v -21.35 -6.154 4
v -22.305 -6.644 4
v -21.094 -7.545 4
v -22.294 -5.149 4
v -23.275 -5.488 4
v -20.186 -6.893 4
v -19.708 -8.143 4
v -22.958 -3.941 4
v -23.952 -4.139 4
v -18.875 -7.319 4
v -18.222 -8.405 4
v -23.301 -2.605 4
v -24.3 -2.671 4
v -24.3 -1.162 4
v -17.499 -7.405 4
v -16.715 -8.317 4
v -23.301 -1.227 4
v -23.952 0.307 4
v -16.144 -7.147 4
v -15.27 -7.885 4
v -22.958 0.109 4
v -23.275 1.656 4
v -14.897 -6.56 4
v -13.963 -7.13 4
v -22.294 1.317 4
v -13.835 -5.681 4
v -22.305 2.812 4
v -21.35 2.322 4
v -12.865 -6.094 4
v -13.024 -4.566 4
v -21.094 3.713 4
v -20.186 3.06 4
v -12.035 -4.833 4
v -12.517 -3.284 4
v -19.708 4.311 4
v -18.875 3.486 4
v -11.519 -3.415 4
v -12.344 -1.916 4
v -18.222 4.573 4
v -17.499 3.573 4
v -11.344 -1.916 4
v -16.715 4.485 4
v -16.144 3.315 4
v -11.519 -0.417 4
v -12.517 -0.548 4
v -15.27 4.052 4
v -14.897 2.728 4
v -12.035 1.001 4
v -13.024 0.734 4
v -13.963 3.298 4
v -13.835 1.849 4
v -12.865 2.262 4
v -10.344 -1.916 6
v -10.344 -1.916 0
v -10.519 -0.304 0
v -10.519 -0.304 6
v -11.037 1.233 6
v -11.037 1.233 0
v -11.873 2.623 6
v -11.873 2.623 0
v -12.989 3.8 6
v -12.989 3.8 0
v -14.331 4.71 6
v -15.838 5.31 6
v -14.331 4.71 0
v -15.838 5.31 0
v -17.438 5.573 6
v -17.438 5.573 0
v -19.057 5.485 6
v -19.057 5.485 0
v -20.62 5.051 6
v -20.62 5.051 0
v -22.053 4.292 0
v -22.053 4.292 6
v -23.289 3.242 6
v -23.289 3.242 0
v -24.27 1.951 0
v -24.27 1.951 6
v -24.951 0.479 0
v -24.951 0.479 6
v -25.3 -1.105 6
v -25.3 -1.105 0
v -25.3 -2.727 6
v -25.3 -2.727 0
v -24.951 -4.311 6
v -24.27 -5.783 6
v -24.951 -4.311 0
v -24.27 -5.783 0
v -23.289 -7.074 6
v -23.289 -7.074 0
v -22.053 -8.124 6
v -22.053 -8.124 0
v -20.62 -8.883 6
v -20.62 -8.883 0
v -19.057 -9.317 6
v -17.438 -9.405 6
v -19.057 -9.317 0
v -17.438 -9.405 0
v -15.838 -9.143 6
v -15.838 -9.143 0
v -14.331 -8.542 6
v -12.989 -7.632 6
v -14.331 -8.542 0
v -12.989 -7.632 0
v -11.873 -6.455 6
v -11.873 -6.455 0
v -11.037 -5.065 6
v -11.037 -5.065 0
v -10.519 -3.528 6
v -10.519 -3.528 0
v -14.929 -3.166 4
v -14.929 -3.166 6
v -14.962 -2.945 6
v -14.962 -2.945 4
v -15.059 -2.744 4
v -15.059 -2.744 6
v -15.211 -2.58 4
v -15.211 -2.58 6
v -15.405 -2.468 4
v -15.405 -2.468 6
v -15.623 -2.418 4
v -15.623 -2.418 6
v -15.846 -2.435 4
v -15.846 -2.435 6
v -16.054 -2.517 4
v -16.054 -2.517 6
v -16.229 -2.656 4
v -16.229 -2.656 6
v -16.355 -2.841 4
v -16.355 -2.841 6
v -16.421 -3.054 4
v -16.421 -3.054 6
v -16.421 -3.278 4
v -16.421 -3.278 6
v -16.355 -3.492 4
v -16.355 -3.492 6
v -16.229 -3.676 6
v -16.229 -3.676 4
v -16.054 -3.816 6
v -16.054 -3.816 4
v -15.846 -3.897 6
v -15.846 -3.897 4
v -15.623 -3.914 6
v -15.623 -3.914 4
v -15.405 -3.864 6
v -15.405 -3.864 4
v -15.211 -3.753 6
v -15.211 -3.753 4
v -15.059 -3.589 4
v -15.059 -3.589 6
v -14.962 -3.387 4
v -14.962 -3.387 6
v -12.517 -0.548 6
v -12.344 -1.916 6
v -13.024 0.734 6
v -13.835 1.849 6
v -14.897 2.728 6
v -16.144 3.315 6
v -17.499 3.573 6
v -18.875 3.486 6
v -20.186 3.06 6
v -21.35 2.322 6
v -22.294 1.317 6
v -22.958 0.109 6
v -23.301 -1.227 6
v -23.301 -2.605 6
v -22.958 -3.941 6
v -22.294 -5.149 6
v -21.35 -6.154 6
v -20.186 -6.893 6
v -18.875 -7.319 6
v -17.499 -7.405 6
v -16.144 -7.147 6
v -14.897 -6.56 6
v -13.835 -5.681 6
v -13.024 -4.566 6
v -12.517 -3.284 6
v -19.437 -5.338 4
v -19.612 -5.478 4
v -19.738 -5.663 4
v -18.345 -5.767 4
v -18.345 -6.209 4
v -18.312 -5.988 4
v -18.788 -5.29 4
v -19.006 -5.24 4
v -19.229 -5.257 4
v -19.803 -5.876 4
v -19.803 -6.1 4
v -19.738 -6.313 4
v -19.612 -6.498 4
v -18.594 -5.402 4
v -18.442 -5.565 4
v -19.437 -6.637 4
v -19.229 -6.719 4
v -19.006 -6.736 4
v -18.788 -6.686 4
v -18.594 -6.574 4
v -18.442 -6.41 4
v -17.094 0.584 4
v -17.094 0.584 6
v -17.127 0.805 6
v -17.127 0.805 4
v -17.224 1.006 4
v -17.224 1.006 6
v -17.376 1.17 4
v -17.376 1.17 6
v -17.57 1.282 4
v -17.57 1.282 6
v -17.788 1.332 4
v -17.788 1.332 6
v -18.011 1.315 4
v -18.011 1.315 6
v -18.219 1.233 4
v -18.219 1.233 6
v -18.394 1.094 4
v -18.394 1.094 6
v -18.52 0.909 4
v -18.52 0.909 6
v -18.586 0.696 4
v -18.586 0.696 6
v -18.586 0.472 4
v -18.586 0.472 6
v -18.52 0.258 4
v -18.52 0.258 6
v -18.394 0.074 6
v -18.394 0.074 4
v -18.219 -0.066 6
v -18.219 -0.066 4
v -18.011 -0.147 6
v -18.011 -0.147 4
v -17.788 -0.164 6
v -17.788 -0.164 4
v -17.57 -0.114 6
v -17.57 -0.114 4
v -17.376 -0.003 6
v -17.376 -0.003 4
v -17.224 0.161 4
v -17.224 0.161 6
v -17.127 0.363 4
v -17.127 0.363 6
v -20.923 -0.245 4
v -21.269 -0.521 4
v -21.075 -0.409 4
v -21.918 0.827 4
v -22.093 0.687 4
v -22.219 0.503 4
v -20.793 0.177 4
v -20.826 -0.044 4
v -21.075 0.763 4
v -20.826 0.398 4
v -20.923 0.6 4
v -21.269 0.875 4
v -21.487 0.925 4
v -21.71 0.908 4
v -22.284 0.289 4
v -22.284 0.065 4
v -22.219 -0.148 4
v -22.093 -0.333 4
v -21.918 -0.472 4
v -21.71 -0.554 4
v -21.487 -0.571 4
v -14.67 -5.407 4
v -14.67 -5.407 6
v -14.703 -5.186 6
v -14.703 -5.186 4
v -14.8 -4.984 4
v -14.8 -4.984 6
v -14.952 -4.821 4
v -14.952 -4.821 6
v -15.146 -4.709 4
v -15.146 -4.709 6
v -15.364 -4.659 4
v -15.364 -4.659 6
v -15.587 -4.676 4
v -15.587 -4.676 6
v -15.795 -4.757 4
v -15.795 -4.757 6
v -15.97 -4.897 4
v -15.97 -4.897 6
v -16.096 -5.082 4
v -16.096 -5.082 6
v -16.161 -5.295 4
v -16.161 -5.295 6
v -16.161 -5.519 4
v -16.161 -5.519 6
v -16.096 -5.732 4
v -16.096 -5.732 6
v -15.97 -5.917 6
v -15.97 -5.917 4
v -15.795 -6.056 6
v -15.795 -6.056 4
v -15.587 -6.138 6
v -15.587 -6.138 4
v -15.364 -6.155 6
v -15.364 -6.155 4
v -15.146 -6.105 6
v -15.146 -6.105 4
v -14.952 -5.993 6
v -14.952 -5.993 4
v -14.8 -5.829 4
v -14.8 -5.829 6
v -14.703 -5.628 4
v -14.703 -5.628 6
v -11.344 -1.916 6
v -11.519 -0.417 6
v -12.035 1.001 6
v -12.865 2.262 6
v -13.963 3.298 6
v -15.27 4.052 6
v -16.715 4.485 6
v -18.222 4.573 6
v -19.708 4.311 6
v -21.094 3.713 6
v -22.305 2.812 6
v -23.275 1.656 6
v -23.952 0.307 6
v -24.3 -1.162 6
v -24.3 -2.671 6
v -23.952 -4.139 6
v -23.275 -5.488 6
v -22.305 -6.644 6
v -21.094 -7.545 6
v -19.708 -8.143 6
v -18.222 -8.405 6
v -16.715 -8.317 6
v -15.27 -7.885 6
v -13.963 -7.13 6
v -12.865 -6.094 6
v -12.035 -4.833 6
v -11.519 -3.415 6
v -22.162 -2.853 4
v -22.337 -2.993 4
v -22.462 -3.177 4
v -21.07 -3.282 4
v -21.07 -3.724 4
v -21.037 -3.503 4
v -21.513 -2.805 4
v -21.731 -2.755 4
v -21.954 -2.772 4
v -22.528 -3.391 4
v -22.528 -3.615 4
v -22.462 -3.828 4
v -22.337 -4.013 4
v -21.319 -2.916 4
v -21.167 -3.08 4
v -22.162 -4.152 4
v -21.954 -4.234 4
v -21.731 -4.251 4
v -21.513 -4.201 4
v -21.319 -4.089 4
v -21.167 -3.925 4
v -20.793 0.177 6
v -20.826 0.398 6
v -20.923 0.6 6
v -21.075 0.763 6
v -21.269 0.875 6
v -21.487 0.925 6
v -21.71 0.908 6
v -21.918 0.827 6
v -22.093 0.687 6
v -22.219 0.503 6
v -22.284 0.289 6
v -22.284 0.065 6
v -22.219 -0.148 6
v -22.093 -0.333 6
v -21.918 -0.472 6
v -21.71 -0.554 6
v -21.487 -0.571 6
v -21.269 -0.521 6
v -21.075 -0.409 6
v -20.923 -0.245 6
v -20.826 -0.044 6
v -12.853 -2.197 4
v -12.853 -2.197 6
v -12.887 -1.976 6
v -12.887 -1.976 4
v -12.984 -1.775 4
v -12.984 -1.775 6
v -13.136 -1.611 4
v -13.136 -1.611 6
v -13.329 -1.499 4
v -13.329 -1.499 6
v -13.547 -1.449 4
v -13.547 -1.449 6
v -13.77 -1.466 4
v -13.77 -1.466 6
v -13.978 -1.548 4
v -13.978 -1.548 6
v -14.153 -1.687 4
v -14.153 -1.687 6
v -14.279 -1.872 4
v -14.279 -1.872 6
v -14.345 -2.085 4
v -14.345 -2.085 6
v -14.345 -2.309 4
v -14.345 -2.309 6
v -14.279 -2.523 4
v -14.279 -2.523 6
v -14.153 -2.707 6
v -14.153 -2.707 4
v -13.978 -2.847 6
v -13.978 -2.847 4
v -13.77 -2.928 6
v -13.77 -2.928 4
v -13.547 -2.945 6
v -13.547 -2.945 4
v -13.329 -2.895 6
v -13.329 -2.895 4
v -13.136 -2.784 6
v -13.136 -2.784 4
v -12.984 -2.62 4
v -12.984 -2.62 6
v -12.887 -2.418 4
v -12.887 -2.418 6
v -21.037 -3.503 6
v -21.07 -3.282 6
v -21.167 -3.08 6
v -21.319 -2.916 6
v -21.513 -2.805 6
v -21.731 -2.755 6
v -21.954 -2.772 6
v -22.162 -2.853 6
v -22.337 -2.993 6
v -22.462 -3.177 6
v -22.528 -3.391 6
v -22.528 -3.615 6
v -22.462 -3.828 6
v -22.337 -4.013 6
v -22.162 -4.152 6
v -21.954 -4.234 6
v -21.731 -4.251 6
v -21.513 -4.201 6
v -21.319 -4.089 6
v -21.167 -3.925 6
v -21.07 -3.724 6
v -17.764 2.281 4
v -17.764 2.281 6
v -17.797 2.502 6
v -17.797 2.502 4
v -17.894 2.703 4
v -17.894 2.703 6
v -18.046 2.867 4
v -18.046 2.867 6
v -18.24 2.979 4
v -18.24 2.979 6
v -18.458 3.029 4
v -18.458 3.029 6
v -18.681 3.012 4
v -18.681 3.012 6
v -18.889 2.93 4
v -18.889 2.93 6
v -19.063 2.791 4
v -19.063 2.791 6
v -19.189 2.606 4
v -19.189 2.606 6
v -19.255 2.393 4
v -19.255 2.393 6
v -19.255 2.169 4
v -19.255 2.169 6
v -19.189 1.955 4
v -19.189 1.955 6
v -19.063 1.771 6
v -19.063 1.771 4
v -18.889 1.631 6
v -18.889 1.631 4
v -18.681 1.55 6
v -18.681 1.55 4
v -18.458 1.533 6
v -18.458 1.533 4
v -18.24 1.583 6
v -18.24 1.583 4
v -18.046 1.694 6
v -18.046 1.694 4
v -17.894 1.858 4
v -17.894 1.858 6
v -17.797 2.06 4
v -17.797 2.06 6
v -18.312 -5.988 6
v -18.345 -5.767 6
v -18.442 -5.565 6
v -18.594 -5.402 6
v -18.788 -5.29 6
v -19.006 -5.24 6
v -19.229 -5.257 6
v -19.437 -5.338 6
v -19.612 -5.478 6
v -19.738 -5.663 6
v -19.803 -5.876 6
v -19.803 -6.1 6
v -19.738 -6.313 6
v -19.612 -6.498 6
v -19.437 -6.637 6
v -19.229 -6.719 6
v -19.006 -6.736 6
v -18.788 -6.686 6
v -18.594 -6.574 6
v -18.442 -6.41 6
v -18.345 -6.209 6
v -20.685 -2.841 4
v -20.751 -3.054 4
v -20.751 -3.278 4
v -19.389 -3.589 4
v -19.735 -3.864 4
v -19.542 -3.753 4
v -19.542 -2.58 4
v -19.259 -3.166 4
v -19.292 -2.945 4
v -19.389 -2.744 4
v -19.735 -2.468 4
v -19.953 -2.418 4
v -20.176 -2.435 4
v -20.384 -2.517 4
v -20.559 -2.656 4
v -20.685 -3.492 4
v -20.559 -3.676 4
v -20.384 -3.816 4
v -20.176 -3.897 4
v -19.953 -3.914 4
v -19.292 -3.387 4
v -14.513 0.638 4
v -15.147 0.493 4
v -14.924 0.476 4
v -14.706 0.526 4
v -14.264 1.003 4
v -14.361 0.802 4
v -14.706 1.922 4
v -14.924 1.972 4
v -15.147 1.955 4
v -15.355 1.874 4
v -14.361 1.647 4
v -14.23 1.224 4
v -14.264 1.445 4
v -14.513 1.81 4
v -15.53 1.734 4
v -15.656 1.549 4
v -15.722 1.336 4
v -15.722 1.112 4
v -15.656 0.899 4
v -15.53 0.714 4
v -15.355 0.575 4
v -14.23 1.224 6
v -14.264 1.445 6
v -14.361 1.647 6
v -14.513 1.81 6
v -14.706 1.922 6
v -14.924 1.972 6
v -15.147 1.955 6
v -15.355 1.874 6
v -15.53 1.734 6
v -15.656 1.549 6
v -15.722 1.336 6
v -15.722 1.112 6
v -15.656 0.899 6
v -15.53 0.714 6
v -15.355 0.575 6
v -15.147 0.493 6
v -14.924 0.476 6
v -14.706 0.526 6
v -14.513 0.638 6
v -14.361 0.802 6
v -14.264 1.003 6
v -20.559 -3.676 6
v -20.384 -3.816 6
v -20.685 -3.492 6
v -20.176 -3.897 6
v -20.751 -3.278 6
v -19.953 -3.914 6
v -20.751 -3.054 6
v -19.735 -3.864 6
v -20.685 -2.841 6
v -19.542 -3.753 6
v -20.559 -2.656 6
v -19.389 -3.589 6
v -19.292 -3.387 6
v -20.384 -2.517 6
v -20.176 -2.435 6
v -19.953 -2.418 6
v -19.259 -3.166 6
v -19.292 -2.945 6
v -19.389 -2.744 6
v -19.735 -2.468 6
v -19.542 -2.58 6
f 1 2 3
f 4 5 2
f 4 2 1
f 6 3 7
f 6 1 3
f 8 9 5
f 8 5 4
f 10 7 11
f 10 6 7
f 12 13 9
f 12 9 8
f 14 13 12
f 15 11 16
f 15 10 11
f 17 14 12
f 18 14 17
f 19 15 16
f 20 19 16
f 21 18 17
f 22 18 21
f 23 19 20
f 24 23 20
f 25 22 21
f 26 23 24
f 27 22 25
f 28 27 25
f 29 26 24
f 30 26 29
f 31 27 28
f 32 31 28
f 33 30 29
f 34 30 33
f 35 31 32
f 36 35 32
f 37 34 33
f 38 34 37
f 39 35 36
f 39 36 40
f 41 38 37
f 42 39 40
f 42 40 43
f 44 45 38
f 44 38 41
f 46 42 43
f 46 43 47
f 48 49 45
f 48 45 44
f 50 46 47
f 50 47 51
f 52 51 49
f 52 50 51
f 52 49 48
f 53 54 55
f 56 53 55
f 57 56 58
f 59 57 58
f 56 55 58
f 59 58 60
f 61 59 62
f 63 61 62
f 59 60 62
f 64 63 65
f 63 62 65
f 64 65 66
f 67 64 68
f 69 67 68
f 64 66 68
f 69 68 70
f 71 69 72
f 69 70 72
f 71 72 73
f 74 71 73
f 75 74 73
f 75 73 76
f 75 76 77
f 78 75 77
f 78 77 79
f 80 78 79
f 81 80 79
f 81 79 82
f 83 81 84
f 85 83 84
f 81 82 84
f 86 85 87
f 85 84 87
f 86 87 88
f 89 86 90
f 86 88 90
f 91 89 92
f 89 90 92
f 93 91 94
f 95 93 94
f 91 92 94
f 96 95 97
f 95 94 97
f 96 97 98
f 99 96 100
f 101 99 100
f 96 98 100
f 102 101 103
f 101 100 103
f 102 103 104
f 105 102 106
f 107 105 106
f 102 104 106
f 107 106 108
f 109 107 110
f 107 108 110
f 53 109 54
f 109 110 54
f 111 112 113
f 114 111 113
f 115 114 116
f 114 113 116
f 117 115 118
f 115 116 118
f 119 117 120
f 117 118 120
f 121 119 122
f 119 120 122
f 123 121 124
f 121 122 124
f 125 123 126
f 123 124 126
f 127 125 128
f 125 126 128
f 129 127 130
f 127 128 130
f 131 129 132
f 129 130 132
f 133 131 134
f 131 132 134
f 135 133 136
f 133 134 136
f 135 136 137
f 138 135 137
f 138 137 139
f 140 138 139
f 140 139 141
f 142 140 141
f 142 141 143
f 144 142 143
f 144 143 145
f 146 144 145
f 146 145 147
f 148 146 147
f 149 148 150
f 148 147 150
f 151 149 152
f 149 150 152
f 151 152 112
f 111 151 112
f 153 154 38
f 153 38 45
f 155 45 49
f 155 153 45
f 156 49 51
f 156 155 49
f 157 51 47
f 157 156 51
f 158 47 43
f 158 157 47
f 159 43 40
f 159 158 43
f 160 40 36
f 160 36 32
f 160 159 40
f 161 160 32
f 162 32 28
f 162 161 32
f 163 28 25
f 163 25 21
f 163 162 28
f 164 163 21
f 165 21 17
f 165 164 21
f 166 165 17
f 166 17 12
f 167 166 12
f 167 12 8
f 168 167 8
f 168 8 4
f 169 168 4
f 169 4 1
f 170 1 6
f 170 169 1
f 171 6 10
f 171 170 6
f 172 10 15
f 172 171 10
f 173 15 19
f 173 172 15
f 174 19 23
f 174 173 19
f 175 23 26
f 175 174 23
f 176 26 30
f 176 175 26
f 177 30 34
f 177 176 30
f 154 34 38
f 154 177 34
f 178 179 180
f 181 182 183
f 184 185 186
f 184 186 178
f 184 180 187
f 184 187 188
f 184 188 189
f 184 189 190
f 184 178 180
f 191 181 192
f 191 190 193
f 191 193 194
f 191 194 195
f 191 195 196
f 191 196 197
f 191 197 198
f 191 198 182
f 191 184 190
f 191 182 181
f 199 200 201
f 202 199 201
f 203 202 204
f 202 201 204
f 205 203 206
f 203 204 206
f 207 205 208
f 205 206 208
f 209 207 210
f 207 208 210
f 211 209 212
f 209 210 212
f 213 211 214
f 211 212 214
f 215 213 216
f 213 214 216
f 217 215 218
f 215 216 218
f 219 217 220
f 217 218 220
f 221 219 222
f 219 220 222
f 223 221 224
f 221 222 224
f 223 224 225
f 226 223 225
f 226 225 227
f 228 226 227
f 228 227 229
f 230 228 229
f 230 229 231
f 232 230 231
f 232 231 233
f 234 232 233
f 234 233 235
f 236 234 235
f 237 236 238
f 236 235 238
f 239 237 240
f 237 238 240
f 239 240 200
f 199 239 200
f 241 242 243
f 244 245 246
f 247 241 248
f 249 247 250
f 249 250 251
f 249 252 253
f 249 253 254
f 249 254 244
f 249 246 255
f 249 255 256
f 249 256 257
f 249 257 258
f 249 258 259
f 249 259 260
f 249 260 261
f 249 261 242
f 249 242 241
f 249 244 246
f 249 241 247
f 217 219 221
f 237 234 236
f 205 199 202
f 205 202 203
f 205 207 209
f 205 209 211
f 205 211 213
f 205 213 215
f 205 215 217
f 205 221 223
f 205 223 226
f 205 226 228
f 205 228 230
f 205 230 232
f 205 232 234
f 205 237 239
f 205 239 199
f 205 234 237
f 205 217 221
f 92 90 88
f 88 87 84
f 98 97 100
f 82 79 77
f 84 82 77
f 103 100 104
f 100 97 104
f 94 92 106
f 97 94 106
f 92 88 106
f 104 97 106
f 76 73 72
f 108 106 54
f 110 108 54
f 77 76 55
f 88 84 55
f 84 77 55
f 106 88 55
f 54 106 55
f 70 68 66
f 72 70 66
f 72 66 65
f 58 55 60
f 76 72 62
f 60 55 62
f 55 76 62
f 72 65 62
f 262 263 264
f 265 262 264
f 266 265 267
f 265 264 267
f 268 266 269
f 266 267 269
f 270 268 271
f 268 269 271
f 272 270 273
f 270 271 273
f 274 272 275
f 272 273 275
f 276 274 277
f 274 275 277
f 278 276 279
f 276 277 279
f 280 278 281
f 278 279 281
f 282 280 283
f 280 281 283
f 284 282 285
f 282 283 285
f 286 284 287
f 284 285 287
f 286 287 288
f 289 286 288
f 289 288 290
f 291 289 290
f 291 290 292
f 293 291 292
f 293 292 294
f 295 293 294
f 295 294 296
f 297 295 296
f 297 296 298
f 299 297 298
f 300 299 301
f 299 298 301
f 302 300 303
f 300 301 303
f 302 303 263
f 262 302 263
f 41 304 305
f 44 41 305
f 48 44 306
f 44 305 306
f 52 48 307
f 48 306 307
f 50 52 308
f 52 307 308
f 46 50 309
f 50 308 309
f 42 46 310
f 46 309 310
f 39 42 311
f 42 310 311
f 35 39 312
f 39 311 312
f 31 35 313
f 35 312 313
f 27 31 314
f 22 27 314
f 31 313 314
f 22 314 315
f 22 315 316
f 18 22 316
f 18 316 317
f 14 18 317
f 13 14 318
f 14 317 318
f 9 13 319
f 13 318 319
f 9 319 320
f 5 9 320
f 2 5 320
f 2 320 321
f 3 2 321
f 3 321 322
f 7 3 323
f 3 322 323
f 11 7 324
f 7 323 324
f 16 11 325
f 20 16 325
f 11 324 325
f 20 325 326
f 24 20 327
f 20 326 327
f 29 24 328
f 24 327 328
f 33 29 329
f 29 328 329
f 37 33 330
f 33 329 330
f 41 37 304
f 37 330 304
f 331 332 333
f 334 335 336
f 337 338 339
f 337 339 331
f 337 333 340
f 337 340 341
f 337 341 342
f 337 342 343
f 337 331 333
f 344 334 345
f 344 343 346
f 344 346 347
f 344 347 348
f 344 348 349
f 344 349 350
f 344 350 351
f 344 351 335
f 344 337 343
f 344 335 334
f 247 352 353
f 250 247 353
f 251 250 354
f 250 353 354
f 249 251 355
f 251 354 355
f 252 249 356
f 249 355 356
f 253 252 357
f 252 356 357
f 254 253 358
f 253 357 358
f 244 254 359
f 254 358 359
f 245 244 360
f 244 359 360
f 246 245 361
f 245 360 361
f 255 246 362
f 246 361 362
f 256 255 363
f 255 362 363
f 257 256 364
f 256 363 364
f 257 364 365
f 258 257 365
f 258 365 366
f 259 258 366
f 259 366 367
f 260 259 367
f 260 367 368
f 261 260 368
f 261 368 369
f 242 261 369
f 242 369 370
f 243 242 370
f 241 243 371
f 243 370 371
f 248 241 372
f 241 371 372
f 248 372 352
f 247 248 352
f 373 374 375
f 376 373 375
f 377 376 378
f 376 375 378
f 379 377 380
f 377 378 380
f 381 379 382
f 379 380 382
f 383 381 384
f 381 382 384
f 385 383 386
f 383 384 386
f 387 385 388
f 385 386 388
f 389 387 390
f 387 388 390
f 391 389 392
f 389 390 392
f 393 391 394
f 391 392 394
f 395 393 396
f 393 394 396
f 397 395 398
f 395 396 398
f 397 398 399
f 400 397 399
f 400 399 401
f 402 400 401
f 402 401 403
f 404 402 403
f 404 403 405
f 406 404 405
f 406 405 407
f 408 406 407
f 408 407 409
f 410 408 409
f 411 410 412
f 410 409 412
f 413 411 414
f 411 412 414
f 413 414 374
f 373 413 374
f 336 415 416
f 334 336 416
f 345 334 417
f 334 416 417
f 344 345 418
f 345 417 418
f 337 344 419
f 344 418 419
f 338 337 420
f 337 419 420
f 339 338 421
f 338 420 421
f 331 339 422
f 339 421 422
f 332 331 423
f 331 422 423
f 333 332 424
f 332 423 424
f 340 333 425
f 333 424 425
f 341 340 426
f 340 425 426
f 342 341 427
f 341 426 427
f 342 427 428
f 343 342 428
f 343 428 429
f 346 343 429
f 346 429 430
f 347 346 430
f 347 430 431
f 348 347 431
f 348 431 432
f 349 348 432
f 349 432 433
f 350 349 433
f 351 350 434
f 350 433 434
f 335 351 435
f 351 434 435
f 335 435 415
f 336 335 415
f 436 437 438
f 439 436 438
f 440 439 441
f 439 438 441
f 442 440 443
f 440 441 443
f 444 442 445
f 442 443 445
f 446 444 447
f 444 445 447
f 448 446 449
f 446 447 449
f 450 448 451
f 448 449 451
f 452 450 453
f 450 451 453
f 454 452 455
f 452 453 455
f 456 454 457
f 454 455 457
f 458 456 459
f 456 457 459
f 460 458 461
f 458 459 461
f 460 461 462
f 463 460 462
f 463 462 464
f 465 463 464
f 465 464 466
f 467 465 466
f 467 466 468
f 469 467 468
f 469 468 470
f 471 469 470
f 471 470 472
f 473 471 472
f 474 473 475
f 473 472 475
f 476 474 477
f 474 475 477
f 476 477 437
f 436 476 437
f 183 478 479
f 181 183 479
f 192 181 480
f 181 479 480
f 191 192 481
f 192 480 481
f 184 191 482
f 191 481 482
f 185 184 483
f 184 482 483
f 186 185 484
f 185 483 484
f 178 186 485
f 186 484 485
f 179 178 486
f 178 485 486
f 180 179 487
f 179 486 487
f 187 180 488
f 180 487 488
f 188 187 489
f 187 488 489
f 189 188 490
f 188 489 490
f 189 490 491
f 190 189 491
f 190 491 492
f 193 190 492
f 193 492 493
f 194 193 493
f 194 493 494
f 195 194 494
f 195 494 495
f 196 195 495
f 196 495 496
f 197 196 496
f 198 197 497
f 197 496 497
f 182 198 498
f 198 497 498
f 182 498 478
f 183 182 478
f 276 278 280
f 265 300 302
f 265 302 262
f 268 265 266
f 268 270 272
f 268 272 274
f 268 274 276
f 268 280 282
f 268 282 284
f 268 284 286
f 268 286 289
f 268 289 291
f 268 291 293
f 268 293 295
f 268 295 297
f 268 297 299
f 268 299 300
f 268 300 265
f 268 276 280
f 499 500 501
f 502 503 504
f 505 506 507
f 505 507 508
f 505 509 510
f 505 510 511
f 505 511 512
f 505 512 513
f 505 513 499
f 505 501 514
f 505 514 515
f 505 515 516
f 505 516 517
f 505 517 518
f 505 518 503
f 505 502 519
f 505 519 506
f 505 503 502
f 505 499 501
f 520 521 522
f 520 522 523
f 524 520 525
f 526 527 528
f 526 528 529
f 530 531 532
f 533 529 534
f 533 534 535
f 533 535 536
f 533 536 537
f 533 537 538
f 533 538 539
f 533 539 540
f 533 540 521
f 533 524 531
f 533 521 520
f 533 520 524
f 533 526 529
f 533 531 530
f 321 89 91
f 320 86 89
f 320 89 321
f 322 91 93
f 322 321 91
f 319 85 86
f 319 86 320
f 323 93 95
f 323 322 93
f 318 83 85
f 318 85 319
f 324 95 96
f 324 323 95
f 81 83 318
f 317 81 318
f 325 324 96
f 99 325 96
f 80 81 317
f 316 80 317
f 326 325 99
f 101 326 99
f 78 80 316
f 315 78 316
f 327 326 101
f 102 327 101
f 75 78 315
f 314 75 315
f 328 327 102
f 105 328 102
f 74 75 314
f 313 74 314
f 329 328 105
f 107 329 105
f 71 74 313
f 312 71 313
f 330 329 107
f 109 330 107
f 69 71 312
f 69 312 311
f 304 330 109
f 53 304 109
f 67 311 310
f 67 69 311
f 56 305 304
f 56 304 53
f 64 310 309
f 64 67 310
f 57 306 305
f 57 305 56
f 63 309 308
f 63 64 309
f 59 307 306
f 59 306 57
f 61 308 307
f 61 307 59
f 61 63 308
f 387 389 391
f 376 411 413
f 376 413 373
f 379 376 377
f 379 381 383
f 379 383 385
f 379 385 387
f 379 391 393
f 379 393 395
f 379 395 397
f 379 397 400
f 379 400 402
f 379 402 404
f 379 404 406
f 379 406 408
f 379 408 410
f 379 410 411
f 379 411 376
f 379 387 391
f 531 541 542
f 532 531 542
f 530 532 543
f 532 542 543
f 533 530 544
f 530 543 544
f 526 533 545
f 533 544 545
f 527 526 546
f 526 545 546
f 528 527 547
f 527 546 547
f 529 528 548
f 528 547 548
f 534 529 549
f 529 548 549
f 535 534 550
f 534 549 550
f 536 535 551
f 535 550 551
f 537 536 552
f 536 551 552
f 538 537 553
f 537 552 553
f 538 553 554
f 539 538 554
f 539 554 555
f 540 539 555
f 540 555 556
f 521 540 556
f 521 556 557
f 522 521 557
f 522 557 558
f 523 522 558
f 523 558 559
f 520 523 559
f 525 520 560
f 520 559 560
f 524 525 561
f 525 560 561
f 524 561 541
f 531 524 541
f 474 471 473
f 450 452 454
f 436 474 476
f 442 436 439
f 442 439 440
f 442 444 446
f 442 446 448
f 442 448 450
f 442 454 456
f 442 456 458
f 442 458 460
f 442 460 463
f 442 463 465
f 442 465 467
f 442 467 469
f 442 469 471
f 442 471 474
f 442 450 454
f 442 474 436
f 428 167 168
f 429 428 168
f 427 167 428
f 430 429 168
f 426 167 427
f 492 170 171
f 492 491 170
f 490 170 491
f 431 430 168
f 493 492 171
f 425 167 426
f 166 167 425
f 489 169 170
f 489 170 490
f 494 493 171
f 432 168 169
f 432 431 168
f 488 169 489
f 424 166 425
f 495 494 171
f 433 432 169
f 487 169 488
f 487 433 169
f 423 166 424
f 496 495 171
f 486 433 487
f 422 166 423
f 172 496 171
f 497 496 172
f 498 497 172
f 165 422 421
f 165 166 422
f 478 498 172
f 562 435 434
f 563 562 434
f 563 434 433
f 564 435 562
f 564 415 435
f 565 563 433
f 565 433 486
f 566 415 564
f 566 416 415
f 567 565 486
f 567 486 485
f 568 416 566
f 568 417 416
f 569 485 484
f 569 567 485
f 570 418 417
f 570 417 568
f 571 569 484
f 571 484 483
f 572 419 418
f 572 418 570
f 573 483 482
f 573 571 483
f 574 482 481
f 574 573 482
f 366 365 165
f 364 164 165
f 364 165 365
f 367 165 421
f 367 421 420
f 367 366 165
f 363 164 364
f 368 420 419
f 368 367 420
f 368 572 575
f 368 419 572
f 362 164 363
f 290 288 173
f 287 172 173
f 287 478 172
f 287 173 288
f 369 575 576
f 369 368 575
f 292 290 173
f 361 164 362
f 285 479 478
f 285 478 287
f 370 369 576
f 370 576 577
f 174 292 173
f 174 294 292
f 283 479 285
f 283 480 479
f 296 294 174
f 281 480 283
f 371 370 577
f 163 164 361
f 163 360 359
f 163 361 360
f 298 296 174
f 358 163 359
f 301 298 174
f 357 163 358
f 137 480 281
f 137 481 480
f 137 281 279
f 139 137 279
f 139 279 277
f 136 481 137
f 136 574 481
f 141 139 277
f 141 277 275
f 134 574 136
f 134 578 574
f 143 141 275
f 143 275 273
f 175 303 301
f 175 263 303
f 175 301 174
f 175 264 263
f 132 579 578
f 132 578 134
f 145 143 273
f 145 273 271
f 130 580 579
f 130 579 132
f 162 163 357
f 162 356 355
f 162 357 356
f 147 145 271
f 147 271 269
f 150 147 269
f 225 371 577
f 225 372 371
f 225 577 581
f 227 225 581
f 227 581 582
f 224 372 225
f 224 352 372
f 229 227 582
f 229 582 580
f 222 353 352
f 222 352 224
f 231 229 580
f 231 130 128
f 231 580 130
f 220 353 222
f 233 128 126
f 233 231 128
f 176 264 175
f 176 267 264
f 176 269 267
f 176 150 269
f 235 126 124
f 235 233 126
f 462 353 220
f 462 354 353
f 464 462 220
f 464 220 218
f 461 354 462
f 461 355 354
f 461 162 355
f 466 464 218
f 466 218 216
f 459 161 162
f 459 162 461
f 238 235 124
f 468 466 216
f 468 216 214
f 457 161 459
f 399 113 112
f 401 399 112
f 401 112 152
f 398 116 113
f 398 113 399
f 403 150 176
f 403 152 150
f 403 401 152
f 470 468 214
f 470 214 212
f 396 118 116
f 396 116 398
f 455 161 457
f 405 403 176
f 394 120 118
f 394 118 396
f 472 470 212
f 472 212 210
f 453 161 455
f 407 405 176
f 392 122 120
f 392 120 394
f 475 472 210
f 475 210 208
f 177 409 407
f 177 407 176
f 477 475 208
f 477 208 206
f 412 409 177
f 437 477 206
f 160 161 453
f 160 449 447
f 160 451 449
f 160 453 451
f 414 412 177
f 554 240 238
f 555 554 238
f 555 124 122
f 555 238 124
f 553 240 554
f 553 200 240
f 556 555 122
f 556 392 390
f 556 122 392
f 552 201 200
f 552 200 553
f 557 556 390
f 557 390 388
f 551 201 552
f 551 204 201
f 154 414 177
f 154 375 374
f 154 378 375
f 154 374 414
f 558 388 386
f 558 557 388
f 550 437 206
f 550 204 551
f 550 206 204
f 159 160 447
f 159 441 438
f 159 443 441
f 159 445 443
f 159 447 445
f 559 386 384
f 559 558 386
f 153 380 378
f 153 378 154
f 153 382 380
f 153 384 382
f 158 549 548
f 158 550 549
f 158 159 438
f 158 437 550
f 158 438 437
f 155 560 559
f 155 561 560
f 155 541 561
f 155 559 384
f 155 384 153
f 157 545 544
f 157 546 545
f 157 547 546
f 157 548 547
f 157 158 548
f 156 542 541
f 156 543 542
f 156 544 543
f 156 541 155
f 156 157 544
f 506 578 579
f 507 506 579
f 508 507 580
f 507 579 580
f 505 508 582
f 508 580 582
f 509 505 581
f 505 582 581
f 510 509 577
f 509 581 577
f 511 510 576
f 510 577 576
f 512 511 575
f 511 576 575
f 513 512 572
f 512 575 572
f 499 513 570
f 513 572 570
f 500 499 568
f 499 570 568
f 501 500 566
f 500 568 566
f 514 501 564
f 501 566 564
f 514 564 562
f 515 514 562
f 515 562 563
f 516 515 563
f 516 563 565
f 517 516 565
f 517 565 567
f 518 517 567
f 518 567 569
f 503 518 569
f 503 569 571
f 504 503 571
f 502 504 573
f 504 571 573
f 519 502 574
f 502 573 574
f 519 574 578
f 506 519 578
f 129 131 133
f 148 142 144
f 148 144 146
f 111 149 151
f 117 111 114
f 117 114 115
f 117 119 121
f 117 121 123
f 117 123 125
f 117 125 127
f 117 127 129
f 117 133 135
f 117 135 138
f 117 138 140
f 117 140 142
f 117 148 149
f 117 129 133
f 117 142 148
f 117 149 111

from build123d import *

# Parameters (mm, degrees)
SKETCH2_R           = 7.5
BOSS_EXTRUDE1_DEPTH = 6
SKETCH3_R           = 6.5
SKETCH3_R_2         = 5.5
CUT_EXTRUDE1_DEPTH  = 2
SKETCH4_R           = 0.75
CUT_EXTRUDE2_DEPTH  = 2


with BuildPart() as part:
    # Sketch2 → Boss-Extrude1 (new body)
    with BuildSketch(Plane.XY):
        with Locations((-17.844062558, -1.916140946)):
            Circle(SKETCH2_R)
    extrude(amount=BOSS_EXTRUDE1_DEPTH)

    # Sketch3 → Cut-Extrude1 (cut)
    with BuildSketch(Plane.XY.offset(6)):
        with Locations((-17.844062558, -1.916140946)):
            Circle(SKETCH3_R)
        with Locations((-17.844062558, -1.916140946)):
            Circle(SKETCH3_R_2, mode=Mode.SUBTRACT)
    extrude(amount=-CUT_EXTRUDE1_DEPTH, mode=Mode.SUBTRACT)

    # Sketch4 → Cut-Extrude2 (cut)
    with BuildSketch(Plane.XY.offset(6)):
        with Locations((-17.844062558, 0.583859054)):
            Circle(SKETCH4_R)
        with Locations((-15.678999049, -3.166140946)):
            Circle(SKETCH4_R)
        with Locations((-20.009126068, -3.166140946)):
            Circle(SKETCH4_R)
        with Locations((-21.542818561, 0.177111078)):
            Circle(SKETCH4_R)
        with Locations((-18.513628873, 2.280784232)):
            Circle(SKETCH4_R)
        with Locations((-14.980242093, 1.224087126)):
            Circle(SKETCH4_R)
        with Locations((-13.603370535, -2.197265767)):
            Circle(SKETCH4_R)
        with Locations((-15.419826565, -5.406925936)):
            Circle(SKETCH4_R)
        with Locations((-19.061781743, -5.987953808)):
            Circle(SKETCH4_R)
        with Locations((-21.786769538, -3.502823545)):
            Circle(SKETCH4_R)
    extrude(amount=-CUT_EXTRUDE2_DEPTH, mode=Mode.SUBTRACT)


solid = part.part
